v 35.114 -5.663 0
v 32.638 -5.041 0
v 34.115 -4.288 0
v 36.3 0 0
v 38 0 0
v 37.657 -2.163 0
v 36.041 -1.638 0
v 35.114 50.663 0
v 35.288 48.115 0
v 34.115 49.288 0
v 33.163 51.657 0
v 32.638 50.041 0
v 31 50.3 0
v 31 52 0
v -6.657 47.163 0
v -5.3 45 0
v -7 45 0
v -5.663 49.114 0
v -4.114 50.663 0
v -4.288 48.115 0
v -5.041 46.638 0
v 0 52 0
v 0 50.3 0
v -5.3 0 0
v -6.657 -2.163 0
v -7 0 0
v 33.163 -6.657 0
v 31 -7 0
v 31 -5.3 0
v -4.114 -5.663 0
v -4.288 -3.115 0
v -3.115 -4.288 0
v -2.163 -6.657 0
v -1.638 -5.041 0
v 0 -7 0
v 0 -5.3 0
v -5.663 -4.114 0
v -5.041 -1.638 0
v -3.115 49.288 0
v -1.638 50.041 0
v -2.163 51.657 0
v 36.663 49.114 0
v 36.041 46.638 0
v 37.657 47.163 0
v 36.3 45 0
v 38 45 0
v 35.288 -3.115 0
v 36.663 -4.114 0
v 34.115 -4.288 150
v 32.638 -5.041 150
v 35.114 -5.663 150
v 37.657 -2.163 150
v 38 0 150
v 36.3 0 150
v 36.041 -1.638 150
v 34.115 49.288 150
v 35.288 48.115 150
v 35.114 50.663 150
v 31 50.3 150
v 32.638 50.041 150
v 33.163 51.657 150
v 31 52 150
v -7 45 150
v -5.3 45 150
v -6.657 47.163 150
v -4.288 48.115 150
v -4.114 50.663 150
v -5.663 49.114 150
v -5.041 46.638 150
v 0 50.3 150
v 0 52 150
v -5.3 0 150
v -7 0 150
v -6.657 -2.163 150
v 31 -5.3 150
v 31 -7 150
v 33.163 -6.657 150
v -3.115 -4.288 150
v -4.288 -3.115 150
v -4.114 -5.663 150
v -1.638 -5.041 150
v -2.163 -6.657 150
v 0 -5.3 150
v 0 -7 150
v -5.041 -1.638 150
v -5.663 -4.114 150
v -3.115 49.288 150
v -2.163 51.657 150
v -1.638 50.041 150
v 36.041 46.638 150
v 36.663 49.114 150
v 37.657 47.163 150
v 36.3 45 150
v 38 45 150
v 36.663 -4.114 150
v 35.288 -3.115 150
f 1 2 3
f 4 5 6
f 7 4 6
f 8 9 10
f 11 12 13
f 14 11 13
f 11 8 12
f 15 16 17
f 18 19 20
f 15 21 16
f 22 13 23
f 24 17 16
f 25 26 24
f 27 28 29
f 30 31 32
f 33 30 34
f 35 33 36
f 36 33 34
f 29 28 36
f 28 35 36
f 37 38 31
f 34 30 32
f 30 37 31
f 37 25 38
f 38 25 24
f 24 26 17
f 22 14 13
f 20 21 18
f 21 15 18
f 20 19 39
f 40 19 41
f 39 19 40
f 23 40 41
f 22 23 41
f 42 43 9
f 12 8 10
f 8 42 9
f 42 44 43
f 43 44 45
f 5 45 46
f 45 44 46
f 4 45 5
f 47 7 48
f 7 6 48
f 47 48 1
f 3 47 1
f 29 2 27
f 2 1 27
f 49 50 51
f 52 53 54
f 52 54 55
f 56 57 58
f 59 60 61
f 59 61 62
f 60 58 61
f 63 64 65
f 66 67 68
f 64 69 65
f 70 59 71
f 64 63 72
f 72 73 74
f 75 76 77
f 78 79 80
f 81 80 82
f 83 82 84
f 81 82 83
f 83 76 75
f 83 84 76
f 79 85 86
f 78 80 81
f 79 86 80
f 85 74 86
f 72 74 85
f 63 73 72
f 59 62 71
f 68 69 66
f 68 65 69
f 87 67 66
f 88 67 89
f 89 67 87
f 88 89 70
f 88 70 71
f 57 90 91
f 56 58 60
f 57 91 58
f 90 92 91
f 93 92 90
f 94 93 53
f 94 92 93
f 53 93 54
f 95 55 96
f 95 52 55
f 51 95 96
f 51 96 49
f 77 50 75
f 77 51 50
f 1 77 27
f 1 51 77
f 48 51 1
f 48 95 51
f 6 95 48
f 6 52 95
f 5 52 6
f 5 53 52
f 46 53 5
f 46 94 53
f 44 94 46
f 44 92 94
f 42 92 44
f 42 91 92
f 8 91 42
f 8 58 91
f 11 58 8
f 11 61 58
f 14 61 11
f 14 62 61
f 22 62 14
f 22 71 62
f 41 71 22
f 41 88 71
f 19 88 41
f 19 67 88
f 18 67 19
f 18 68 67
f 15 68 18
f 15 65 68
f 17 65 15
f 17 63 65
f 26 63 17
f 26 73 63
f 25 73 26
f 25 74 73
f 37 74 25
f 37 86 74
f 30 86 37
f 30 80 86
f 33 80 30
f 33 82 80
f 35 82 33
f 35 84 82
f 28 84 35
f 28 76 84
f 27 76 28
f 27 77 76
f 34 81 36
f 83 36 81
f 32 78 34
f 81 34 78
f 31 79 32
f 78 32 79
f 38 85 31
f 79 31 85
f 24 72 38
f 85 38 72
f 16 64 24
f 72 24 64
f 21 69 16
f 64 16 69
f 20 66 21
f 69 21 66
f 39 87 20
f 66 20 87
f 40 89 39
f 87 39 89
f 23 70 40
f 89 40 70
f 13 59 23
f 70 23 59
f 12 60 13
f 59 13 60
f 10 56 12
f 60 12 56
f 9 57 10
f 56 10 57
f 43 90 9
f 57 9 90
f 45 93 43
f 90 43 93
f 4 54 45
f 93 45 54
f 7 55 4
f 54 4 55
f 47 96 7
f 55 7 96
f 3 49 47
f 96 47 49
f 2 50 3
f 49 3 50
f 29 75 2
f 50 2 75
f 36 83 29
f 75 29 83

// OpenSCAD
circle_res_high = 20;
circle_res_low = 10;
// * try to add the minimum retention to the individual objects. 
// like the tube should be part of the battery so it gets moved together.
// * reduce the cutouts around the pi for wiring so the pi is retained better. 
// * add more room for the headers on the pi so I can route wires out for leds/etc
// * consider making the wire space for the pi have a bridge over it to help retain 
// the sled in the case
// * the cable/usb adapter relief is wider than it needs to be, and so the sled is
// > 5mm wider than it needs to be
// * 2" thin walled pvc might still fit it if I wanted to make a waterproof version 
// but I need to consider how to access the sma
// * make the sma access area slightly conical/sloped/self supported to not need supports
// * make the battery retention lip slightly conical to not need supports




module rubber_band_hook(){
    thickness = 3.5;
    height = 3;
    union(){
        translate([0,0,(height+thickness)/2])cylinder(d=thickness, h=height+thickness, center=true, $fn=100);
        translate([0,(thickness+thickness/3)/2,height+thickness/2])rotate([90,0,0])cylinder(d=thickness, h=thickness+thickness/3, center=true, $fn=100);
    }
}

module ring(id,od,$fn){
    difference(){
        circle(r=od/2, center=true);
        circle(r=id/2, center=true);
    }
}

module pi_mount(){
    via_diameter = 2.6;
    via_pad_diameter = 3.5*2;
    via_dist_short = 23;
    via_dist_long = 58;
    lift = .5;
    pi_height = 10.6+2;
    pi_width = 30;
    pi_len = 65;
    width_plus_connector = 49;
    plate_thickness = 2;
    pi_xy_overhang = 1;
    usb_port_offset = 41.4;
    power_port_offset = 54;
    hdmi_port_offset = 12.4;

    post_0_pos = [via_pad_diameter/2+width_plus_connector-pi_width+pi_xy_overhang/2,via_pad_diameter/2+pi_xy_overhang/2,plate_thickness+lift/2];
    module lift_post(){
        cylinder(lift, d=via_pad_diameter-1, center=true, $fn=100);
    }
    module neg_lift_post(){
        cylinder(lift+10, d1=via_diameter, center=true, $fn=100);
    }
    difference(){
        union(){
            cube([width_plus_connector+pi_xy_overhang,pi_len+pi_xy_overhang,plate_thickness]);
            translate(post_0_pos)lift_post();
            translate(post_0_pos+[via_dist_short,0,0])lift_post();
            translate(post_0_pos+[0,via_dist_long,0])lift_post();
            translate(post_0_pos+[via_dist_short,via_dist_long,0])lift_post();
            // translate([post_0_pos[0]-via_diameter-4,4+pi_len-power_port_offset,plate_thickness])rotate([0,0,-90])rubber_band_hook();
        }
        union(){
            translate(post_0_pos)neg_lift_post();
            translate(post_0_pos+[via_dist_short,0,0])neg_lift_post();
            translate(post_0_pos+[0,via_dist_long,0])neg_lift_post();
            translate(post_0_pos+[via_dist_short,via_dist_long,0])neg_lift_post();
        }
    }
}
module pi_mount_glue_in_lift(){
    via_diameter = 2.6;
    via_pad_diameter = 3.5*2;
    via_dist_short = 23;
    via_dist_long = 58;
    lift = .5;
    pi_height = 10.6+2;
    pi_width = 30;
    pi_len = 65;
    width_plus_connector = 49;
    plate_thickness = 2;
    pi_xy_overhang = 1;
    usb_port_offset = 41.4;
    power_port_offset = 54;
    hdmi_port_offset = 12.4;

    post_0_pos = [via_pad_diameter/2+width_plus_connector-pi_width+pi_xy_overhang/2,via_pad_diameter/2+pi_xy_overhang/2,0];
    module lift_post_slot(){
        cube(size=[via_pad_diameter, via_pad_diameter, 10], center=true);
    }
    module neg_lift_post(){
        cylinder(lift+10, d1=via_diameter, center=true, $fn=100);
    }
    difference(){
        union(){
            cube([width_plus_connector+pi_xy_overhang,pi_len+pi_xy_overhang,plate_thickness]);
            // translate(post_0_pos)lift_post();
            // translate(post_0_pos+[via_dist_short,0,0])lift_post();
            // translate(post_0_pos+[0,via_dist_long,0])lift_post();
            // translate(post_0_pos+[via_dist_short,via_dist_long,0])lift_post();
            // translate([post_0_pos[0]-via_diameter-4,4+pi_len-power_port_offset,plate_thickness])rotate([0,0,-90])rubber_band_hook();
        }
        // union(){
        //     translate(post_0_pos)lift_post_slot();
        //     translate(post_0_pos+[via_dist_short,0,0])lift_post_slot();
        //     translate(post_0_pos+[0,via_dist_long,0])lift_post_slot();
        //     translate(post_0_pos+[via_dist_short,via_dist_long,0])lift_post_slot();
        // }
    }
}

module pi_mount_pin(){
    head_diameter = 3.5*2-1;
    head_thickness = 2;
    shaft_diameter = 2.6-.1;
    shaft_len = 2+1.5;
    union(){
        cylinder(h=head_thickness,d=head_diameter,center=true,$fn=6);
        translate([0,0,head_thickness/2+shaft_len/2])cylinder(h=shaft_len,d=shaft_diameter,center=true,$fn=100);
    }
}
module rtl_mount(){
    case_len=60;
    case_width=17;
    case_height=14.2;
    usb_height=4.5;
    usb_width=12;
    sma_diameter=8.5;
    looseness=.1;
    wall_thickness=2;
    difference(){
        cube([case_len+looseness+wall_thickness*2,case_width+looseness+wall_thickness*2,case_height+looseness+wall_thickness*2]);
        translate([0,wall_thickness+looseness,wall_thickness+looseness])union(){
            cube([case_len+looseness+wall_thickness,case_width+looseness,case_height+looseness]);
            translate([wall_thickness,(case_width+looseness)/2,(case_height+looseness)/2])rotate([0,90,0])cylinder(d=sma_diameter+looseness,h=case_len+wall_thickness*2,$fn=100);
        }
    }
}
module rtl_mount_retention(){
    translate([0,(case_width+looseness-usb_width)/2,(case_height-usb_height+looseness)/2])cube([wall_thickness*2,usb_width+looseness,usb_height+looseness]);
}
module battery_mount(){
    // a tube we can intersect with something else to stick them together,
    // include a modeled in end and retention ring
    batt_diameter = 22;
    batt_len = 106.9;
    wall_thickness = 2;
    looseness = .2;
    retention_ring_looseness=.1;
    // union(){
    //     translate([0,0,wall_thickness/2])ring(id=batt_diameter+looseness-wall_thickness,od=batt_diameter+looseness,height=wall_thickness,$fn=100);
    //     translate([0,0,(batt_len+looseness+wall_thickness*2)/2])ring(id=batt_diameter+looseness,od=batt_diameter+looseness+wall_thickness,height=batt_len+looseness*2+wall_thickness*2,%fn=100);
    // }
    union(){
        linear_extrude(wall_thickness)ring(id=batt_diameter+looseness-wall_thickness,od=batt_diameter+looseness+wall_thickness/2,$fn=100);
        linear_extrude(batt_len+looseness+wall_thickness*2)ring(id=batt_diameter+looseness,od=batt_diameter+looseness+wall_thickness,$fn=100);
    }
    // }
}
module battery_mount_retention_ring(){
    // maybe add a rubber band hook
    batt_diameter = 22;
    batt_len = 106.9;
    wall_thickness = 2;
    looseness = .1;
    retention_ring_looseness=.1;
    // union(){
    //     linear_extrude(wall_thickness)ring(id=batt_diameter+looseness,$fn=100);
    //     // maybe as a notch in the ring? or as a hook on the tube?
    // }
}
module battery_relief(){
    batt_diameter = 27.5;
    batt_len = 106.9;
    batt_face_inset = 2.5;
    batt_face_clear_dist = 75;
    looseness = 0.1;
    translate([0,0,-batt_face_clear_dist/2])linear_extrude(batt_face_clear_dist)circle(d=batt_diameter-batt_face_inset*2,$fn=circle_res_high);
    linear_extrude(batt_len+looseness*2)circle(d=batt_diameter+looseness*2,$fn=circle_res_high);
}
module rtl_relief(){
    rtl_height=14.5;
    rtl_width=17.3;
    rtl_len=60.6;
    looseness=0.1;
    sma_bare_threads_len=4.1;
    lock_washer=1;
    sma_bare_threads_diameter=6.5;
    sma_connector_diameter=7.8;
    bulkhead_thickness=3;
    rtl_to_bulkhead_external=34.3;
    rtl_to_bulkhead=rtl_to_bulkhead_external-bulkhead_thickness;
    rtl_to_connector=6.7;
    bulkhead_to_connector=10;
    linear_extrude(rtl_len+looseness*2+50)square(size=[rtl_height+looseness*2, rtl_width+looseness*2], center=true);
    translate([0,0,-sma_bare_threads_len])linear_extrude(sma_bare_threads_len)circle(d=sma_bare_threads_diameter+looseness,center=true,$fn=circle_res_high);
    // clear area to access sma connector
    translate([0,0,-rtl_to_bulkhead])linear_extrude(rtl_to_bulkhead-sma_bare_threads_len)hull(){
        circle(d=rtl_width,$fn=circle_res_low);
        translate([0,20,0])circle(d=rtl_width,$fn=circle_res_low);
    }
    //clear out usb area
    
    // translate([0,0,rtl_len+looseness])linear_extrude(50)hull(){
    //     circle(d=rtl_width,$fn=circle_res_low);
    //     translate([0,10,0])circle(d=rtl_width,$fn=circle_res_low);
    // }

}
module pi_board_shape(){
    minkowski_diameter=7;
    base_len=65;
    base_width=30;
    minkowski(){
        circle(d=minkowski_diameter,$fn=circle_res_high);
        square([base_len-minkowski_diameter,base_width-minkowski_diameter]);
    }
}
module pi_relief(){
    minkowski_diameter=6;
    base_len=65;
    base_width=30;
    hdmi_port_offset=12.4;
    usb_port_offset=41.4;
    power_port_offset=54;
    via_inset=3.5;
    lift_pad_radius=4.4;
    height=10;
    bottom_clear_height=.5;
    board_thickness=1.3;
    clear_height_above_board=13;
    looseness=.1;
    pin_len=3;
    pin_radius=1.3;
    ribbon_guard_width=20;
    ribbon_guard_overhang=2.5;
    cable_min_width = 48.4-base_width;
    usb_housing_standoff = 3;
    cable_channel_len=base_len+30;
    cable_channel_width = 20;
    cable_channel_height=10;
    cable_channel_height_extra=10;
    // area for stuff on bottom
    linear_extrude(bottom_clear_height)difference(){
        pi_board_shape();
        union(){
            circle(r=lift_pad_radius);
            translate([base_len-via_inset*2,0,0])circle(r=lift_pad_radius);
            translate([base_len-via_inset*2,base_width-via_inset*2,0])circle(r=lift_pad_radius);
            translate([0,base_width-via_inset*2,0])circle(r=lift_pad_radius);
        }
    }
    // area for board
    translate([0,0,bottom_clear_height])linear_extrude(board_thickness+clear_height_above_board)minkowski(){
        pi_board_shape();
        square(looseness);
    }
    // add holes for pins
    translate([0,0,-pin_len+bottom_clear_height])
    linear_extrude(pin_len)union(){
        circle(r=pin_radius,$fn=circle_res_low);
        translate([base_len-via_inset*2,0,0])circle(r=pin_radius,$fn=circle_res_low);
        translate([base_len-via_inset*2,base_width-via_inset*2,0])circle(r=pin_radius,$fn=circle_res_low);
        translate([0,base_width-via_inset*2,0])circle(r=pin_radius,$fn=circle_res_low);
    }
    // area for sd_card and ribbon protector
    translate([-ribbon_guard_overhang-via_inset,via_inset/2,bottom_clear_height+board_thickness])linear_extrude(board_thickness+cable_channel_height+cable_channel_height_extra)square([base_len+ribbon_guard_overhang*2,ribbon_guard_width]);
    // cable channel
    translate([base_len-cable_channel_len-via_inset-4,base_width+cable_channel_width+usb_housing_standoff-via_inset,bottom_clear_height+board_thickness-cable_channel_height/2+cable_channel_height_extra/2-4])rotate([0,0,270])linear_extrude(cable_channel_height+cable_channel_height_extra)square([cable_channel_width+usb_housing_standoff,cable_channel_len]);
}

module component_reliefs(){
    //line these up so they don't interfere with eachother
    translate([44,-10,14.5])pi_relief();
    translate([.5,.5,.5])rotate([0,90,0])battery_relief();
    translate([76.3,25,-2])rotate([-90,0,180])rotate([0,90,0])rtl_relief();
}

module component_shadow(){
    hull(){
        linear_extrude(.1)projection()rotate([0,90,0])component_reliefs();
        translate([0,0,100])rotate([0,90,0])component_reliefs();
    }
    
}

module component_container(){
    linear_extrude(69.5)minkowski(){
        square([31,45]);
        circle(r=5,$fn=circle_res_high);
    }
    translate([10,10,0])linear_extrude(109)circle(d=30);
}

module component_assembly(){
    difference(){
        translate([-9,-9.5,0])component_container();
        translate([0,0,107.5])rotate([0,90,0])component_reliefs();
    }
}

module case(){
    linear_extrude(150)difference(){
        minkowski(){
            square([31,45]);
            circle(r=7,$fn=circle_res_high);
        }
        minkowski(){
            square([31,45]);
            circle(r=5.3,$fn=circle_res_high);
        }
    // bottom with port for usb bulkhead offset to open side
    }
    // shroud + ports for sma bulkhead, usb bulkhead, led(s), button
}
// component_assembly();
case();
// battery_relief();
// rtl_relief();
// pi_relief();
// assembly_internals_case();
// pi_mount();
// translate([-10,-10,0])pi_mount_pin();
// rubber_band_hook();
//battery_mount();
// rtl_mount();
